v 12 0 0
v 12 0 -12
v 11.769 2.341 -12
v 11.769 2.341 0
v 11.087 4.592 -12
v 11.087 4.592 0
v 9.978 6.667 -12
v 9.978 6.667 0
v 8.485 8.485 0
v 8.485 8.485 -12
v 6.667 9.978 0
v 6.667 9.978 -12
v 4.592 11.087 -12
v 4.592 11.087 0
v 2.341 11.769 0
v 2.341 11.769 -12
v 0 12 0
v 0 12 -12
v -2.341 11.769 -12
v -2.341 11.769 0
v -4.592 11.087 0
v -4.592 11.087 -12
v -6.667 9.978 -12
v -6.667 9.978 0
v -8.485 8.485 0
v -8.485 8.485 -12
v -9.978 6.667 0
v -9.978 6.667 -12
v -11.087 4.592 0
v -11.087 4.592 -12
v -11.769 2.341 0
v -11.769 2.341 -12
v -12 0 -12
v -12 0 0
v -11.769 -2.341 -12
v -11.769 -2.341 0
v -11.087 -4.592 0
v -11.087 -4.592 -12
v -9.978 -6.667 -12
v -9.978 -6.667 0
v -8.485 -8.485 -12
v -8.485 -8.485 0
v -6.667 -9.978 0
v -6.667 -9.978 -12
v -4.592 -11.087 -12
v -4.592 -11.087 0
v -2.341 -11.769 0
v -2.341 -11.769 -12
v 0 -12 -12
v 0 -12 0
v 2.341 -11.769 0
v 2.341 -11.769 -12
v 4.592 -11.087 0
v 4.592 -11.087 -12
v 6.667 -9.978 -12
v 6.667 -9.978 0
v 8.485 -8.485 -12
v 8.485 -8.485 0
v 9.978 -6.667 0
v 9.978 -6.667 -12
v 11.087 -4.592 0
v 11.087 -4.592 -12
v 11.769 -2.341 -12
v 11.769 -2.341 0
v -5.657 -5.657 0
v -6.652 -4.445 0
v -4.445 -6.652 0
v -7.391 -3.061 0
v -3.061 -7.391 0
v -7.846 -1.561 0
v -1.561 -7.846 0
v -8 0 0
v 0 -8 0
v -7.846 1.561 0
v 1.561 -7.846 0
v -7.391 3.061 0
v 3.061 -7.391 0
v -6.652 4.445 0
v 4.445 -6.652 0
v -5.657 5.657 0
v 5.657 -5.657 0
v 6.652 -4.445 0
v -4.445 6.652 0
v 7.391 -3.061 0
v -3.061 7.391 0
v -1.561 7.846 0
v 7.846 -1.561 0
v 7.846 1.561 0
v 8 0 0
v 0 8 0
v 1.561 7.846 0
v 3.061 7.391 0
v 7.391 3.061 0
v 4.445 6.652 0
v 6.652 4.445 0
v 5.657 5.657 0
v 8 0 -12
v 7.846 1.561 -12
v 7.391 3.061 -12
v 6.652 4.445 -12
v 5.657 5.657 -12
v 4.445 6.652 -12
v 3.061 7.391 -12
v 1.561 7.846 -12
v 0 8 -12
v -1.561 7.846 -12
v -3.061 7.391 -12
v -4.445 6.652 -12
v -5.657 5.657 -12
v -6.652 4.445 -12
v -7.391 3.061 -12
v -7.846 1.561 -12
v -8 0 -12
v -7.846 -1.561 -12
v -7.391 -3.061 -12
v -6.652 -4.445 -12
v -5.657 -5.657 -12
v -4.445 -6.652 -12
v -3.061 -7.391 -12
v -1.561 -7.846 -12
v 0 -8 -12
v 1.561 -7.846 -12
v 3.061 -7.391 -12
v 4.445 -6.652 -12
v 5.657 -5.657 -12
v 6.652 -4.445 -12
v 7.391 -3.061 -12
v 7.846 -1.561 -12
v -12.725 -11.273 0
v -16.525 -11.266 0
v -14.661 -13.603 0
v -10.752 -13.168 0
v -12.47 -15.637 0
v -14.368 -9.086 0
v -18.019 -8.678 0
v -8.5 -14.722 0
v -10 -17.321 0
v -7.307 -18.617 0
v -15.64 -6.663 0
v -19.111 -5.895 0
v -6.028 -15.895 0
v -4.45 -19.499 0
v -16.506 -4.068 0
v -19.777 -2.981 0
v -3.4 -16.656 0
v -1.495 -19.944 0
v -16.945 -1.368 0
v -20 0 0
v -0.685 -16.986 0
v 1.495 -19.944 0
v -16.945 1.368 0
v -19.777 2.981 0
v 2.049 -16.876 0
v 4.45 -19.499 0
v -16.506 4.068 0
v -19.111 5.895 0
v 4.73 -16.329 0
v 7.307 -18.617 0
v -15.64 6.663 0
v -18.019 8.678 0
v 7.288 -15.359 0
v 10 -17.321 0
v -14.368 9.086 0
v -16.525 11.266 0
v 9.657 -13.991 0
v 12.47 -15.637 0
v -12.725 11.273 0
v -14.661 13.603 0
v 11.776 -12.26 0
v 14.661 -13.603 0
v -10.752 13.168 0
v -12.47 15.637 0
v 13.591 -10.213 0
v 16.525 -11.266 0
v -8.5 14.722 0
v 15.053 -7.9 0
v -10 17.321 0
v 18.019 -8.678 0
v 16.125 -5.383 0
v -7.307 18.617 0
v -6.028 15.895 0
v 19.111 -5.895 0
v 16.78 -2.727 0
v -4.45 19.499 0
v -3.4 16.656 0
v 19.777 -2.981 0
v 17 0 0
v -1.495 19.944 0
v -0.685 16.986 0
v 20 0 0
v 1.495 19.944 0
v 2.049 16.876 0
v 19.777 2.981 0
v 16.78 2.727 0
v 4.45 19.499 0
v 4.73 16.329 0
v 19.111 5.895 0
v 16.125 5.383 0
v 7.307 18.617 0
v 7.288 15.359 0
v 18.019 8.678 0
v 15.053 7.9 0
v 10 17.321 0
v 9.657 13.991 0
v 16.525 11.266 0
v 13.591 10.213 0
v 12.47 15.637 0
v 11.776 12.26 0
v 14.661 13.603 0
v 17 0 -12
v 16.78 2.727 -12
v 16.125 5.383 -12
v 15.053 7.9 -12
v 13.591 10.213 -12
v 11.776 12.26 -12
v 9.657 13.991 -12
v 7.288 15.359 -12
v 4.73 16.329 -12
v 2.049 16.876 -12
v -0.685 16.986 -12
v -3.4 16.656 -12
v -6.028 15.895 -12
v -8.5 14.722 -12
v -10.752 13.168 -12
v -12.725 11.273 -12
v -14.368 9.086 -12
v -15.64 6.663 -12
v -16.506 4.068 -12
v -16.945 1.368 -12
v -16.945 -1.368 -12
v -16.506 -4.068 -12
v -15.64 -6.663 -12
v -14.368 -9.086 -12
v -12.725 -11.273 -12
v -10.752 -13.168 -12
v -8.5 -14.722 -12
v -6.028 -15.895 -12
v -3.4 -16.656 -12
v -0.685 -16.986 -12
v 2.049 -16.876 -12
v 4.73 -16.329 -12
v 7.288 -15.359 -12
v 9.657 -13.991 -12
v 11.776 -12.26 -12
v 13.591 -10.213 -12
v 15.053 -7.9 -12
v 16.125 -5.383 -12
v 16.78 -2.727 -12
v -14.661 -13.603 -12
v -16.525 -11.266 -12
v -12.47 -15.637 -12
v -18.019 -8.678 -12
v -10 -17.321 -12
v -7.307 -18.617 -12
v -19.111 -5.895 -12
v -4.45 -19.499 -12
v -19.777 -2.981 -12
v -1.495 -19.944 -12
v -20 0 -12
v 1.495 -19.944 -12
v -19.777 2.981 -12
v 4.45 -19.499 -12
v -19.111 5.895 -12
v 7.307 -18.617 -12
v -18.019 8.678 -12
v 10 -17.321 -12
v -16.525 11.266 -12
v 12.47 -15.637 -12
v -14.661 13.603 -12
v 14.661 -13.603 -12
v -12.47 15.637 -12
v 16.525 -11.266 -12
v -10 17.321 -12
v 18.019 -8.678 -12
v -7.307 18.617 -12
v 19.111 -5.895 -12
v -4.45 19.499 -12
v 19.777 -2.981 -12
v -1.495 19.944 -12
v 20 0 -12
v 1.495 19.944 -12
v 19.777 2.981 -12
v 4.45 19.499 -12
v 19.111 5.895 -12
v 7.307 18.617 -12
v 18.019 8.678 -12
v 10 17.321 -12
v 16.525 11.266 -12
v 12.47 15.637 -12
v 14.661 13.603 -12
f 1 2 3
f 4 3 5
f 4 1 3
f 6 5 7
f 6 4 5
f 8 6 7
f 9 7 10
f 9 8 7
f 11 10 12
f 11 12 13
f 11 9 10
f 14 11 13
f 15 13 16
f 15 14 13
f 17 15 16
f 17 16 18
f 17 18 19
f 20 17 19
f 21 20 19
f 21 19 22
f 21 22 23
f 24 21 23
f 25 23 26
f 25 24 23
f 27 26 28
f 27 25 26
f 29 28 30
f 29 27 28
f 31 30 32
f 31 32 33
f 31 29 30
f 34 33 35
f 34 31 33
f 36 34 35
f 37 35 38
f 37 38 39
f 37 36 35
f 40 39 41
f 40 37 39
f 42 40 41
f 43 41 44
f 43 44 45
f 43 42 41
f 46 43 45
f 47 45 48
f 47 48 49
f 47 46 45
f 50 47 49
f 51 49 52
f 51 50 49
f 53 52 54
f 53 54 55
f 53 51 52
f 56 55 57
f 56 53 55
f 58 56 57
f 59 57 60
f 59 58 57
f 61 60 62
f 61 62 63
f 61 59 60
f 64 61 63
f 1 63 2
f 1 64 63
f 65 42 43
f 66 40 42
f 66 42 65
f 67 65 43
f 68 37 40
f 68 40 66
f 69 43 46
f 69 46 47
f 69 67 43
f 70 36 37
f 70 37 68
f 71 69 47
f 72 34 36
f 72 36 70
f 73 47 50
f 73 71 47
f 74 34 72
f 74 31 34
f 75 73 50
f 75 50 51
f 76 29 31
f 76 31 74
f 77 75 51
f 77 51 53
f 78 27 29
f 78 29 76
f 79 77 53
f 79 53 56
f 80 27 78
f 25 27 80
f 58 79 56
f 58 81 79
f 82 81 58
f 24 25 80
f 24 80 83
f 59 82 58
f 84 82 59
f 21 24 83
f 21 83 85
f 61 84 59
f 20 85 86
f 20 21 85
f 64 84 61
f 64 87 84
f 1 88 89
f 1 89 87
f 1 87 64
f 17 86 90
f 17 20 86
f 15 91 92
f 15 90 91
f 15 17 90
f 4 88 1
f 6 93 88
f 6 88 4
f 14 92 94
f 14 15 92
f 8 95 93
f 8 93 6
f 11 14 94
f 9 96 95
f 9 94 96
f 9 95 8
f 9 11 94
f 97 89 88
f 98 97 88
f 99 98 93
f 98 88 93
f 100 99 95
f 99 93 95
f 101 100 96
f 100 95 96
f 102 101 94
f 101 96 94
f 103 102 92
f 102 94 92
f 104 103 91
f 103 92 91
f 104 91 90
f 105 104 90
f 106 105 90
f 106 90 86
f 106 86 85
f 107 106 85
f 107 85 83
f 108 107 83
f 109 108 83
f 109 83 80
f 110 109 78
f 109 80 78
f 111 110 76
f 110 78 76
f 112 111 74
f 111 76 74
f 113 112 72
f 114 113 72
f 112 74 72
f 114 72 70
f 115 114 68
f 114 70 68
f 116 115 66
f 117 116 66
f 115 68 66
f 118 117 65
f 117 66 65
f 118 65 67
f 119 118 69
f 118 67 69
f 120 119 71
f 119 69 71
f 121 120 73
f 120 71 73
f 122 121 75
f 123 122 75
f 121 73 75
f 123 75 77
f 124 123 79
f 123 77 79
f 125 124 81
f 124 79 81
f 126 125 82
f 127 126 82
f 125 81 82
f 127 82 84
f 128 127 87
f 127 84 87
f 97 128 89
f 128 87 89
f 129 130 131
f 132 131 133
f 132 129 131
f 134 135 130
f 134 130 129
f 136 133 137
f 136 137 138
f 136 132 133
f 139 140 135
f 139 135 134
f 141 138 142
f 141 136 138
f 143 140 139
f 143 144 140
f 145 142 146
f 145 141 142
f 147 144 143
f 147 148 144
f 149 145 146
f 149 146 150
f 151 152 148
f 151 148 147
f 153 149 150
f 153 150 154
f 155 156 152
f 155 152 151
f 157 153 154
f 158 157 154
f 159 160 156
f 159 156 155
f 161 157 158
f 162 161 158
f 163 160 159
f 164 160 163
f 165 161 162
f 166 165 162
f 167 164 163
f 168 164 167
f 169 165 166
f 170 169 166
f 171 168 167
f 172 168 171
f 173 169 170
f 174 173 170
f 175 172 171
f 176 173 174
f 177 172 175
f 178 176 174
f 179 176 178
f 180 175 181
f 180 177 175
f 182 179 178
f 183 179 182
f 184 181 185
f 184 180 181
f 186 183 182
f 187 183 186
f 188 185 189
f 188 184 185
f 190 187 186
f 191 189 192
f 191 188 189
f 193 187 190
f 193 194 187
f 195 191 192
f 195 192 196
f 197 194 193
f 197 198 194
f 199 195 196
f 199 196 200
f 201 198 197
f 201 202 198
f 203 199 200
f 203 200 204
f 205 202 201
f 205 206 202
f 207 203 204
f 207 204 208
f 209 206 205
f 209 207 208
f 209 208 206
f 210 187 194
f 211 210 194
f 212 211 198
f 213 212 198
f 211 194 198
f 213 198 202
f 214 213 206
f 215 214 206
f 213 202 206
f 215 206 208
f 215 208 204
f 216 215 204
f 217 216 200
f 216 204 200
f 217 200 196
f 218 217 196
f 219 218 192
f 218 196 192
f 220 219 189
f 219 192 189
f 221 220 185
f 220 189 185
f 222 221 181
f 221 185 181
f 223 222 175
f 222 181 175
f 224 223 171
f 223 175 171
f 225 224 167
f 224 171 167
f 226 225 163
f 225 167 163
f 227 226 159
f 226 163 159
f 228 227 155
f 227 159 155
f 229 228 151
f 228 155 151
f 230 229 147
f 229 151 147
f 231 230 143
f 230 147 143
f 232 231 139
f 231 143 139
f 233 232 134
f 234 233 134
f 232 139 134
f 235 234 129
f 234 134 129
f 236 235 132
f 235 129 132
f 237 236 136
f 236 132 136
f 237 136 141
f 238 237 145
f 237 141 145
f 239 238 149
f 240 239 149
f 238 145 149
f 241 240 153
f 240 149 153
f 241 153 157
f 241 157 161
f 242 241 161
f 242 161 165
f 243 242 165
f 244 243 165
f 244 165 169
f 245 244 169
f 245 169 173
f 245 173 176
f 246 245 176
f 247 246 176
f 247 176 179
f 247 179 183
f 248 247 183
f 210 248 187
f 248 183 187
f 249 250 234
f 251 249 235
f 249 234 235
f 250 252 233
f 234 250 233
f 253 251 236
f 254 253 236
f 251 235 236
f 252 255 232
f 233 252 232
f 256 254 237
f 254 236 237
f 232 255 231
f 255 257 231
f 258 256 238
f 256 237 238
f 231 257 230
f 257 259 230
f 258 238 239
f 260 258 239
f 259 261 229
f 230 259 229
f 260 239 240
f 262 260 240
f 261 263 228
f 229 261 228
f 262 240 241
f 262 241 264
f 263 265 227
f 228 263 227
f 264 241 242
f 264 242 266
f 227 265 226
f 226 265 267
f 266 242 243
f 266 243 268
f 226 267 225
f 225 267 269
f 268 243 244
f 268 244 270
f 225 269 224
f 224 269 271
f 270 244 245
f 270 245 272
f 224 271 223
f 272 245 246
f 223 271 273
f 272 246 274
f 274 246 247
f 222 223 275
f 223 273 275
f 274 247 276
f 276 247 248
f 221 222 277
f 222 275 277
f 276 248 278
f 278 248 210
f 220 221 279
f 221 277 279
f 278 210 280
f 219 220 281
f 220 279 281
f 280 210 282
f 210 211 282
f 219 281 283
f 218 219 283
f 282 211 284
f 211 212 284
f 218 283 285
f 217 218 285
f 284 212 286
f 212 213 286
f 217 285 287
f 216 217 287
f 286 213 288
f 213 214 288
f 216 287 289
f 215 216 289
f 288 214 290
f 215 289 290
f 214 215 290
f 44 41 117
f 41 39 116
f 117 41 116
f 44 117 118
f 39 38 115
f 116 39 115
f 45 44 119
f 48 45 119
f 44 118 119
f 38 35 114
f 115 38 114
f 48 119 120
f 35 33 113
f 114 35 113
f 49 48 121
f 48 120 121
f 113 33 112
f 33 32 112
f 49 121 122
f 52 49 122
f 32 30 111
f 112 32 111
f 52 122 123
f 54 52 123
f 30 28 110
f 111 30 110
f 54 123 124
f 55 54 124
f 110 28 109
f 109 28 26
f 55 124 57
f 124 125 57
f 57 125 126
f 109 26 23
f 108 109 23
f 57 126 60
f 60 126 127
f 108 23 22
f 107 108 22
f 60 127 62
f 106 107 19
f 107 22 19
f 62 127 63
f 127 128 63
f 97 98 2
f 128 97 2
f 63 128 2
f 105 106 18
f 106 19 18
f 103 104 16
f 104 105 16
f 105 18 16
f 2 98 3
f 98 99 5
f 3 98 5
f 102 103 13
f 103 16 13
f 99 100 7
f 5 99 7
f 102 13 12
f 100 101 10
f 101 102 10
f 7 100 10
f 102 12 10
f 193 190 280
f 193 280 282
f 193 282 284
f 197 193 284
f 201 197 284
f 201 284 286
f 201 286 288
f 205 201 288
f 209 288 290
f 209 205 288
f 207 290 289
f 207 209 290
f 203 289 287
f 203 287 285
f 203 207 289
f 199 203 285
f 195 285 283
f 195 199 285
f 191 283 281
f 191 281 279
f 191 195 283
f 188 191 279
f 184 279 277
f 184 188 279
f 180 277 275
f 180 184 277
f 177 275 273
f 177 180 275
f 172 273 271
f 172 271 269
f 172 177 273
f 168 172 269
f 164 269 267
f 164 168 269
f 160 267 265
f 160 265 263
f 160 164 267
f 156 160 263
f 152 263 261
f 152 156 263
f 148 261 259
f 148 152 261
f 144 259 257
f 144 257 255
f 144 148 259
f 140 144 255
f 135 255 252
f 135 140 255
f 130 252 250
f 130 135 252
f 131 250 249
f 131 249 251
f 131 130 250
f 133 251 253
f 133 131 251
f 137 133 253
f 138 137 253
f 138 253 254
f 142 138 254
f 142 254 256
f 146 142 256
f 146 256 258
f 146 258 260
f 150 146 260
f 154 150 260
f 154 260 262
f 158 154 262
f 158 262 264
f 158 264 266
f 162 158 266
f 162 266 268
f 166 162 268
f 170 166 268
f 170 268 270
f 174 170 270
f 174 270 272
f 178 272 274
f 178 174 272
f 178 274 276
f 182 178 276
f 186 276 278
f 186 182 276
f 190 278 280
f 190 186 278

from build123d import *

# Parameters (mm, degrees)
SKETCH1_R           = 20
SKETCH1_R_2         = 17
BOSS_EXTRUDE1_DEPTH = 12
SKETCH2_R           = 12
SKETCH2_R_2         = 8
BOSS_EXTRUDE2_DEPTH = 12


with BuildPart() as part:
    # Sketch1 → Boss-Extrude1 (new body)
    with BuildSketch(Plane.XY):
        Circle(SKETCH1_R)
        Circle(SKETCH1_R_2, mode=Mode.SUBTRACT)
    extrude(amount=-BOSS_EXTRUDE1_DEPTH)


with BuildPart() as body_2:
    # Sketch2 → Boss-Extrude2 (new body)
    with BuildSketch(Plane.XY):
        Circle(SKETCH2_R)
        Circle(SKETCH2_R_2, mode=Mode.SUBTRACT)
    extrude(amount=-BOSS_EXTRUDE2_DEPTH)


solid = Compound([part.part, body_2.part])
